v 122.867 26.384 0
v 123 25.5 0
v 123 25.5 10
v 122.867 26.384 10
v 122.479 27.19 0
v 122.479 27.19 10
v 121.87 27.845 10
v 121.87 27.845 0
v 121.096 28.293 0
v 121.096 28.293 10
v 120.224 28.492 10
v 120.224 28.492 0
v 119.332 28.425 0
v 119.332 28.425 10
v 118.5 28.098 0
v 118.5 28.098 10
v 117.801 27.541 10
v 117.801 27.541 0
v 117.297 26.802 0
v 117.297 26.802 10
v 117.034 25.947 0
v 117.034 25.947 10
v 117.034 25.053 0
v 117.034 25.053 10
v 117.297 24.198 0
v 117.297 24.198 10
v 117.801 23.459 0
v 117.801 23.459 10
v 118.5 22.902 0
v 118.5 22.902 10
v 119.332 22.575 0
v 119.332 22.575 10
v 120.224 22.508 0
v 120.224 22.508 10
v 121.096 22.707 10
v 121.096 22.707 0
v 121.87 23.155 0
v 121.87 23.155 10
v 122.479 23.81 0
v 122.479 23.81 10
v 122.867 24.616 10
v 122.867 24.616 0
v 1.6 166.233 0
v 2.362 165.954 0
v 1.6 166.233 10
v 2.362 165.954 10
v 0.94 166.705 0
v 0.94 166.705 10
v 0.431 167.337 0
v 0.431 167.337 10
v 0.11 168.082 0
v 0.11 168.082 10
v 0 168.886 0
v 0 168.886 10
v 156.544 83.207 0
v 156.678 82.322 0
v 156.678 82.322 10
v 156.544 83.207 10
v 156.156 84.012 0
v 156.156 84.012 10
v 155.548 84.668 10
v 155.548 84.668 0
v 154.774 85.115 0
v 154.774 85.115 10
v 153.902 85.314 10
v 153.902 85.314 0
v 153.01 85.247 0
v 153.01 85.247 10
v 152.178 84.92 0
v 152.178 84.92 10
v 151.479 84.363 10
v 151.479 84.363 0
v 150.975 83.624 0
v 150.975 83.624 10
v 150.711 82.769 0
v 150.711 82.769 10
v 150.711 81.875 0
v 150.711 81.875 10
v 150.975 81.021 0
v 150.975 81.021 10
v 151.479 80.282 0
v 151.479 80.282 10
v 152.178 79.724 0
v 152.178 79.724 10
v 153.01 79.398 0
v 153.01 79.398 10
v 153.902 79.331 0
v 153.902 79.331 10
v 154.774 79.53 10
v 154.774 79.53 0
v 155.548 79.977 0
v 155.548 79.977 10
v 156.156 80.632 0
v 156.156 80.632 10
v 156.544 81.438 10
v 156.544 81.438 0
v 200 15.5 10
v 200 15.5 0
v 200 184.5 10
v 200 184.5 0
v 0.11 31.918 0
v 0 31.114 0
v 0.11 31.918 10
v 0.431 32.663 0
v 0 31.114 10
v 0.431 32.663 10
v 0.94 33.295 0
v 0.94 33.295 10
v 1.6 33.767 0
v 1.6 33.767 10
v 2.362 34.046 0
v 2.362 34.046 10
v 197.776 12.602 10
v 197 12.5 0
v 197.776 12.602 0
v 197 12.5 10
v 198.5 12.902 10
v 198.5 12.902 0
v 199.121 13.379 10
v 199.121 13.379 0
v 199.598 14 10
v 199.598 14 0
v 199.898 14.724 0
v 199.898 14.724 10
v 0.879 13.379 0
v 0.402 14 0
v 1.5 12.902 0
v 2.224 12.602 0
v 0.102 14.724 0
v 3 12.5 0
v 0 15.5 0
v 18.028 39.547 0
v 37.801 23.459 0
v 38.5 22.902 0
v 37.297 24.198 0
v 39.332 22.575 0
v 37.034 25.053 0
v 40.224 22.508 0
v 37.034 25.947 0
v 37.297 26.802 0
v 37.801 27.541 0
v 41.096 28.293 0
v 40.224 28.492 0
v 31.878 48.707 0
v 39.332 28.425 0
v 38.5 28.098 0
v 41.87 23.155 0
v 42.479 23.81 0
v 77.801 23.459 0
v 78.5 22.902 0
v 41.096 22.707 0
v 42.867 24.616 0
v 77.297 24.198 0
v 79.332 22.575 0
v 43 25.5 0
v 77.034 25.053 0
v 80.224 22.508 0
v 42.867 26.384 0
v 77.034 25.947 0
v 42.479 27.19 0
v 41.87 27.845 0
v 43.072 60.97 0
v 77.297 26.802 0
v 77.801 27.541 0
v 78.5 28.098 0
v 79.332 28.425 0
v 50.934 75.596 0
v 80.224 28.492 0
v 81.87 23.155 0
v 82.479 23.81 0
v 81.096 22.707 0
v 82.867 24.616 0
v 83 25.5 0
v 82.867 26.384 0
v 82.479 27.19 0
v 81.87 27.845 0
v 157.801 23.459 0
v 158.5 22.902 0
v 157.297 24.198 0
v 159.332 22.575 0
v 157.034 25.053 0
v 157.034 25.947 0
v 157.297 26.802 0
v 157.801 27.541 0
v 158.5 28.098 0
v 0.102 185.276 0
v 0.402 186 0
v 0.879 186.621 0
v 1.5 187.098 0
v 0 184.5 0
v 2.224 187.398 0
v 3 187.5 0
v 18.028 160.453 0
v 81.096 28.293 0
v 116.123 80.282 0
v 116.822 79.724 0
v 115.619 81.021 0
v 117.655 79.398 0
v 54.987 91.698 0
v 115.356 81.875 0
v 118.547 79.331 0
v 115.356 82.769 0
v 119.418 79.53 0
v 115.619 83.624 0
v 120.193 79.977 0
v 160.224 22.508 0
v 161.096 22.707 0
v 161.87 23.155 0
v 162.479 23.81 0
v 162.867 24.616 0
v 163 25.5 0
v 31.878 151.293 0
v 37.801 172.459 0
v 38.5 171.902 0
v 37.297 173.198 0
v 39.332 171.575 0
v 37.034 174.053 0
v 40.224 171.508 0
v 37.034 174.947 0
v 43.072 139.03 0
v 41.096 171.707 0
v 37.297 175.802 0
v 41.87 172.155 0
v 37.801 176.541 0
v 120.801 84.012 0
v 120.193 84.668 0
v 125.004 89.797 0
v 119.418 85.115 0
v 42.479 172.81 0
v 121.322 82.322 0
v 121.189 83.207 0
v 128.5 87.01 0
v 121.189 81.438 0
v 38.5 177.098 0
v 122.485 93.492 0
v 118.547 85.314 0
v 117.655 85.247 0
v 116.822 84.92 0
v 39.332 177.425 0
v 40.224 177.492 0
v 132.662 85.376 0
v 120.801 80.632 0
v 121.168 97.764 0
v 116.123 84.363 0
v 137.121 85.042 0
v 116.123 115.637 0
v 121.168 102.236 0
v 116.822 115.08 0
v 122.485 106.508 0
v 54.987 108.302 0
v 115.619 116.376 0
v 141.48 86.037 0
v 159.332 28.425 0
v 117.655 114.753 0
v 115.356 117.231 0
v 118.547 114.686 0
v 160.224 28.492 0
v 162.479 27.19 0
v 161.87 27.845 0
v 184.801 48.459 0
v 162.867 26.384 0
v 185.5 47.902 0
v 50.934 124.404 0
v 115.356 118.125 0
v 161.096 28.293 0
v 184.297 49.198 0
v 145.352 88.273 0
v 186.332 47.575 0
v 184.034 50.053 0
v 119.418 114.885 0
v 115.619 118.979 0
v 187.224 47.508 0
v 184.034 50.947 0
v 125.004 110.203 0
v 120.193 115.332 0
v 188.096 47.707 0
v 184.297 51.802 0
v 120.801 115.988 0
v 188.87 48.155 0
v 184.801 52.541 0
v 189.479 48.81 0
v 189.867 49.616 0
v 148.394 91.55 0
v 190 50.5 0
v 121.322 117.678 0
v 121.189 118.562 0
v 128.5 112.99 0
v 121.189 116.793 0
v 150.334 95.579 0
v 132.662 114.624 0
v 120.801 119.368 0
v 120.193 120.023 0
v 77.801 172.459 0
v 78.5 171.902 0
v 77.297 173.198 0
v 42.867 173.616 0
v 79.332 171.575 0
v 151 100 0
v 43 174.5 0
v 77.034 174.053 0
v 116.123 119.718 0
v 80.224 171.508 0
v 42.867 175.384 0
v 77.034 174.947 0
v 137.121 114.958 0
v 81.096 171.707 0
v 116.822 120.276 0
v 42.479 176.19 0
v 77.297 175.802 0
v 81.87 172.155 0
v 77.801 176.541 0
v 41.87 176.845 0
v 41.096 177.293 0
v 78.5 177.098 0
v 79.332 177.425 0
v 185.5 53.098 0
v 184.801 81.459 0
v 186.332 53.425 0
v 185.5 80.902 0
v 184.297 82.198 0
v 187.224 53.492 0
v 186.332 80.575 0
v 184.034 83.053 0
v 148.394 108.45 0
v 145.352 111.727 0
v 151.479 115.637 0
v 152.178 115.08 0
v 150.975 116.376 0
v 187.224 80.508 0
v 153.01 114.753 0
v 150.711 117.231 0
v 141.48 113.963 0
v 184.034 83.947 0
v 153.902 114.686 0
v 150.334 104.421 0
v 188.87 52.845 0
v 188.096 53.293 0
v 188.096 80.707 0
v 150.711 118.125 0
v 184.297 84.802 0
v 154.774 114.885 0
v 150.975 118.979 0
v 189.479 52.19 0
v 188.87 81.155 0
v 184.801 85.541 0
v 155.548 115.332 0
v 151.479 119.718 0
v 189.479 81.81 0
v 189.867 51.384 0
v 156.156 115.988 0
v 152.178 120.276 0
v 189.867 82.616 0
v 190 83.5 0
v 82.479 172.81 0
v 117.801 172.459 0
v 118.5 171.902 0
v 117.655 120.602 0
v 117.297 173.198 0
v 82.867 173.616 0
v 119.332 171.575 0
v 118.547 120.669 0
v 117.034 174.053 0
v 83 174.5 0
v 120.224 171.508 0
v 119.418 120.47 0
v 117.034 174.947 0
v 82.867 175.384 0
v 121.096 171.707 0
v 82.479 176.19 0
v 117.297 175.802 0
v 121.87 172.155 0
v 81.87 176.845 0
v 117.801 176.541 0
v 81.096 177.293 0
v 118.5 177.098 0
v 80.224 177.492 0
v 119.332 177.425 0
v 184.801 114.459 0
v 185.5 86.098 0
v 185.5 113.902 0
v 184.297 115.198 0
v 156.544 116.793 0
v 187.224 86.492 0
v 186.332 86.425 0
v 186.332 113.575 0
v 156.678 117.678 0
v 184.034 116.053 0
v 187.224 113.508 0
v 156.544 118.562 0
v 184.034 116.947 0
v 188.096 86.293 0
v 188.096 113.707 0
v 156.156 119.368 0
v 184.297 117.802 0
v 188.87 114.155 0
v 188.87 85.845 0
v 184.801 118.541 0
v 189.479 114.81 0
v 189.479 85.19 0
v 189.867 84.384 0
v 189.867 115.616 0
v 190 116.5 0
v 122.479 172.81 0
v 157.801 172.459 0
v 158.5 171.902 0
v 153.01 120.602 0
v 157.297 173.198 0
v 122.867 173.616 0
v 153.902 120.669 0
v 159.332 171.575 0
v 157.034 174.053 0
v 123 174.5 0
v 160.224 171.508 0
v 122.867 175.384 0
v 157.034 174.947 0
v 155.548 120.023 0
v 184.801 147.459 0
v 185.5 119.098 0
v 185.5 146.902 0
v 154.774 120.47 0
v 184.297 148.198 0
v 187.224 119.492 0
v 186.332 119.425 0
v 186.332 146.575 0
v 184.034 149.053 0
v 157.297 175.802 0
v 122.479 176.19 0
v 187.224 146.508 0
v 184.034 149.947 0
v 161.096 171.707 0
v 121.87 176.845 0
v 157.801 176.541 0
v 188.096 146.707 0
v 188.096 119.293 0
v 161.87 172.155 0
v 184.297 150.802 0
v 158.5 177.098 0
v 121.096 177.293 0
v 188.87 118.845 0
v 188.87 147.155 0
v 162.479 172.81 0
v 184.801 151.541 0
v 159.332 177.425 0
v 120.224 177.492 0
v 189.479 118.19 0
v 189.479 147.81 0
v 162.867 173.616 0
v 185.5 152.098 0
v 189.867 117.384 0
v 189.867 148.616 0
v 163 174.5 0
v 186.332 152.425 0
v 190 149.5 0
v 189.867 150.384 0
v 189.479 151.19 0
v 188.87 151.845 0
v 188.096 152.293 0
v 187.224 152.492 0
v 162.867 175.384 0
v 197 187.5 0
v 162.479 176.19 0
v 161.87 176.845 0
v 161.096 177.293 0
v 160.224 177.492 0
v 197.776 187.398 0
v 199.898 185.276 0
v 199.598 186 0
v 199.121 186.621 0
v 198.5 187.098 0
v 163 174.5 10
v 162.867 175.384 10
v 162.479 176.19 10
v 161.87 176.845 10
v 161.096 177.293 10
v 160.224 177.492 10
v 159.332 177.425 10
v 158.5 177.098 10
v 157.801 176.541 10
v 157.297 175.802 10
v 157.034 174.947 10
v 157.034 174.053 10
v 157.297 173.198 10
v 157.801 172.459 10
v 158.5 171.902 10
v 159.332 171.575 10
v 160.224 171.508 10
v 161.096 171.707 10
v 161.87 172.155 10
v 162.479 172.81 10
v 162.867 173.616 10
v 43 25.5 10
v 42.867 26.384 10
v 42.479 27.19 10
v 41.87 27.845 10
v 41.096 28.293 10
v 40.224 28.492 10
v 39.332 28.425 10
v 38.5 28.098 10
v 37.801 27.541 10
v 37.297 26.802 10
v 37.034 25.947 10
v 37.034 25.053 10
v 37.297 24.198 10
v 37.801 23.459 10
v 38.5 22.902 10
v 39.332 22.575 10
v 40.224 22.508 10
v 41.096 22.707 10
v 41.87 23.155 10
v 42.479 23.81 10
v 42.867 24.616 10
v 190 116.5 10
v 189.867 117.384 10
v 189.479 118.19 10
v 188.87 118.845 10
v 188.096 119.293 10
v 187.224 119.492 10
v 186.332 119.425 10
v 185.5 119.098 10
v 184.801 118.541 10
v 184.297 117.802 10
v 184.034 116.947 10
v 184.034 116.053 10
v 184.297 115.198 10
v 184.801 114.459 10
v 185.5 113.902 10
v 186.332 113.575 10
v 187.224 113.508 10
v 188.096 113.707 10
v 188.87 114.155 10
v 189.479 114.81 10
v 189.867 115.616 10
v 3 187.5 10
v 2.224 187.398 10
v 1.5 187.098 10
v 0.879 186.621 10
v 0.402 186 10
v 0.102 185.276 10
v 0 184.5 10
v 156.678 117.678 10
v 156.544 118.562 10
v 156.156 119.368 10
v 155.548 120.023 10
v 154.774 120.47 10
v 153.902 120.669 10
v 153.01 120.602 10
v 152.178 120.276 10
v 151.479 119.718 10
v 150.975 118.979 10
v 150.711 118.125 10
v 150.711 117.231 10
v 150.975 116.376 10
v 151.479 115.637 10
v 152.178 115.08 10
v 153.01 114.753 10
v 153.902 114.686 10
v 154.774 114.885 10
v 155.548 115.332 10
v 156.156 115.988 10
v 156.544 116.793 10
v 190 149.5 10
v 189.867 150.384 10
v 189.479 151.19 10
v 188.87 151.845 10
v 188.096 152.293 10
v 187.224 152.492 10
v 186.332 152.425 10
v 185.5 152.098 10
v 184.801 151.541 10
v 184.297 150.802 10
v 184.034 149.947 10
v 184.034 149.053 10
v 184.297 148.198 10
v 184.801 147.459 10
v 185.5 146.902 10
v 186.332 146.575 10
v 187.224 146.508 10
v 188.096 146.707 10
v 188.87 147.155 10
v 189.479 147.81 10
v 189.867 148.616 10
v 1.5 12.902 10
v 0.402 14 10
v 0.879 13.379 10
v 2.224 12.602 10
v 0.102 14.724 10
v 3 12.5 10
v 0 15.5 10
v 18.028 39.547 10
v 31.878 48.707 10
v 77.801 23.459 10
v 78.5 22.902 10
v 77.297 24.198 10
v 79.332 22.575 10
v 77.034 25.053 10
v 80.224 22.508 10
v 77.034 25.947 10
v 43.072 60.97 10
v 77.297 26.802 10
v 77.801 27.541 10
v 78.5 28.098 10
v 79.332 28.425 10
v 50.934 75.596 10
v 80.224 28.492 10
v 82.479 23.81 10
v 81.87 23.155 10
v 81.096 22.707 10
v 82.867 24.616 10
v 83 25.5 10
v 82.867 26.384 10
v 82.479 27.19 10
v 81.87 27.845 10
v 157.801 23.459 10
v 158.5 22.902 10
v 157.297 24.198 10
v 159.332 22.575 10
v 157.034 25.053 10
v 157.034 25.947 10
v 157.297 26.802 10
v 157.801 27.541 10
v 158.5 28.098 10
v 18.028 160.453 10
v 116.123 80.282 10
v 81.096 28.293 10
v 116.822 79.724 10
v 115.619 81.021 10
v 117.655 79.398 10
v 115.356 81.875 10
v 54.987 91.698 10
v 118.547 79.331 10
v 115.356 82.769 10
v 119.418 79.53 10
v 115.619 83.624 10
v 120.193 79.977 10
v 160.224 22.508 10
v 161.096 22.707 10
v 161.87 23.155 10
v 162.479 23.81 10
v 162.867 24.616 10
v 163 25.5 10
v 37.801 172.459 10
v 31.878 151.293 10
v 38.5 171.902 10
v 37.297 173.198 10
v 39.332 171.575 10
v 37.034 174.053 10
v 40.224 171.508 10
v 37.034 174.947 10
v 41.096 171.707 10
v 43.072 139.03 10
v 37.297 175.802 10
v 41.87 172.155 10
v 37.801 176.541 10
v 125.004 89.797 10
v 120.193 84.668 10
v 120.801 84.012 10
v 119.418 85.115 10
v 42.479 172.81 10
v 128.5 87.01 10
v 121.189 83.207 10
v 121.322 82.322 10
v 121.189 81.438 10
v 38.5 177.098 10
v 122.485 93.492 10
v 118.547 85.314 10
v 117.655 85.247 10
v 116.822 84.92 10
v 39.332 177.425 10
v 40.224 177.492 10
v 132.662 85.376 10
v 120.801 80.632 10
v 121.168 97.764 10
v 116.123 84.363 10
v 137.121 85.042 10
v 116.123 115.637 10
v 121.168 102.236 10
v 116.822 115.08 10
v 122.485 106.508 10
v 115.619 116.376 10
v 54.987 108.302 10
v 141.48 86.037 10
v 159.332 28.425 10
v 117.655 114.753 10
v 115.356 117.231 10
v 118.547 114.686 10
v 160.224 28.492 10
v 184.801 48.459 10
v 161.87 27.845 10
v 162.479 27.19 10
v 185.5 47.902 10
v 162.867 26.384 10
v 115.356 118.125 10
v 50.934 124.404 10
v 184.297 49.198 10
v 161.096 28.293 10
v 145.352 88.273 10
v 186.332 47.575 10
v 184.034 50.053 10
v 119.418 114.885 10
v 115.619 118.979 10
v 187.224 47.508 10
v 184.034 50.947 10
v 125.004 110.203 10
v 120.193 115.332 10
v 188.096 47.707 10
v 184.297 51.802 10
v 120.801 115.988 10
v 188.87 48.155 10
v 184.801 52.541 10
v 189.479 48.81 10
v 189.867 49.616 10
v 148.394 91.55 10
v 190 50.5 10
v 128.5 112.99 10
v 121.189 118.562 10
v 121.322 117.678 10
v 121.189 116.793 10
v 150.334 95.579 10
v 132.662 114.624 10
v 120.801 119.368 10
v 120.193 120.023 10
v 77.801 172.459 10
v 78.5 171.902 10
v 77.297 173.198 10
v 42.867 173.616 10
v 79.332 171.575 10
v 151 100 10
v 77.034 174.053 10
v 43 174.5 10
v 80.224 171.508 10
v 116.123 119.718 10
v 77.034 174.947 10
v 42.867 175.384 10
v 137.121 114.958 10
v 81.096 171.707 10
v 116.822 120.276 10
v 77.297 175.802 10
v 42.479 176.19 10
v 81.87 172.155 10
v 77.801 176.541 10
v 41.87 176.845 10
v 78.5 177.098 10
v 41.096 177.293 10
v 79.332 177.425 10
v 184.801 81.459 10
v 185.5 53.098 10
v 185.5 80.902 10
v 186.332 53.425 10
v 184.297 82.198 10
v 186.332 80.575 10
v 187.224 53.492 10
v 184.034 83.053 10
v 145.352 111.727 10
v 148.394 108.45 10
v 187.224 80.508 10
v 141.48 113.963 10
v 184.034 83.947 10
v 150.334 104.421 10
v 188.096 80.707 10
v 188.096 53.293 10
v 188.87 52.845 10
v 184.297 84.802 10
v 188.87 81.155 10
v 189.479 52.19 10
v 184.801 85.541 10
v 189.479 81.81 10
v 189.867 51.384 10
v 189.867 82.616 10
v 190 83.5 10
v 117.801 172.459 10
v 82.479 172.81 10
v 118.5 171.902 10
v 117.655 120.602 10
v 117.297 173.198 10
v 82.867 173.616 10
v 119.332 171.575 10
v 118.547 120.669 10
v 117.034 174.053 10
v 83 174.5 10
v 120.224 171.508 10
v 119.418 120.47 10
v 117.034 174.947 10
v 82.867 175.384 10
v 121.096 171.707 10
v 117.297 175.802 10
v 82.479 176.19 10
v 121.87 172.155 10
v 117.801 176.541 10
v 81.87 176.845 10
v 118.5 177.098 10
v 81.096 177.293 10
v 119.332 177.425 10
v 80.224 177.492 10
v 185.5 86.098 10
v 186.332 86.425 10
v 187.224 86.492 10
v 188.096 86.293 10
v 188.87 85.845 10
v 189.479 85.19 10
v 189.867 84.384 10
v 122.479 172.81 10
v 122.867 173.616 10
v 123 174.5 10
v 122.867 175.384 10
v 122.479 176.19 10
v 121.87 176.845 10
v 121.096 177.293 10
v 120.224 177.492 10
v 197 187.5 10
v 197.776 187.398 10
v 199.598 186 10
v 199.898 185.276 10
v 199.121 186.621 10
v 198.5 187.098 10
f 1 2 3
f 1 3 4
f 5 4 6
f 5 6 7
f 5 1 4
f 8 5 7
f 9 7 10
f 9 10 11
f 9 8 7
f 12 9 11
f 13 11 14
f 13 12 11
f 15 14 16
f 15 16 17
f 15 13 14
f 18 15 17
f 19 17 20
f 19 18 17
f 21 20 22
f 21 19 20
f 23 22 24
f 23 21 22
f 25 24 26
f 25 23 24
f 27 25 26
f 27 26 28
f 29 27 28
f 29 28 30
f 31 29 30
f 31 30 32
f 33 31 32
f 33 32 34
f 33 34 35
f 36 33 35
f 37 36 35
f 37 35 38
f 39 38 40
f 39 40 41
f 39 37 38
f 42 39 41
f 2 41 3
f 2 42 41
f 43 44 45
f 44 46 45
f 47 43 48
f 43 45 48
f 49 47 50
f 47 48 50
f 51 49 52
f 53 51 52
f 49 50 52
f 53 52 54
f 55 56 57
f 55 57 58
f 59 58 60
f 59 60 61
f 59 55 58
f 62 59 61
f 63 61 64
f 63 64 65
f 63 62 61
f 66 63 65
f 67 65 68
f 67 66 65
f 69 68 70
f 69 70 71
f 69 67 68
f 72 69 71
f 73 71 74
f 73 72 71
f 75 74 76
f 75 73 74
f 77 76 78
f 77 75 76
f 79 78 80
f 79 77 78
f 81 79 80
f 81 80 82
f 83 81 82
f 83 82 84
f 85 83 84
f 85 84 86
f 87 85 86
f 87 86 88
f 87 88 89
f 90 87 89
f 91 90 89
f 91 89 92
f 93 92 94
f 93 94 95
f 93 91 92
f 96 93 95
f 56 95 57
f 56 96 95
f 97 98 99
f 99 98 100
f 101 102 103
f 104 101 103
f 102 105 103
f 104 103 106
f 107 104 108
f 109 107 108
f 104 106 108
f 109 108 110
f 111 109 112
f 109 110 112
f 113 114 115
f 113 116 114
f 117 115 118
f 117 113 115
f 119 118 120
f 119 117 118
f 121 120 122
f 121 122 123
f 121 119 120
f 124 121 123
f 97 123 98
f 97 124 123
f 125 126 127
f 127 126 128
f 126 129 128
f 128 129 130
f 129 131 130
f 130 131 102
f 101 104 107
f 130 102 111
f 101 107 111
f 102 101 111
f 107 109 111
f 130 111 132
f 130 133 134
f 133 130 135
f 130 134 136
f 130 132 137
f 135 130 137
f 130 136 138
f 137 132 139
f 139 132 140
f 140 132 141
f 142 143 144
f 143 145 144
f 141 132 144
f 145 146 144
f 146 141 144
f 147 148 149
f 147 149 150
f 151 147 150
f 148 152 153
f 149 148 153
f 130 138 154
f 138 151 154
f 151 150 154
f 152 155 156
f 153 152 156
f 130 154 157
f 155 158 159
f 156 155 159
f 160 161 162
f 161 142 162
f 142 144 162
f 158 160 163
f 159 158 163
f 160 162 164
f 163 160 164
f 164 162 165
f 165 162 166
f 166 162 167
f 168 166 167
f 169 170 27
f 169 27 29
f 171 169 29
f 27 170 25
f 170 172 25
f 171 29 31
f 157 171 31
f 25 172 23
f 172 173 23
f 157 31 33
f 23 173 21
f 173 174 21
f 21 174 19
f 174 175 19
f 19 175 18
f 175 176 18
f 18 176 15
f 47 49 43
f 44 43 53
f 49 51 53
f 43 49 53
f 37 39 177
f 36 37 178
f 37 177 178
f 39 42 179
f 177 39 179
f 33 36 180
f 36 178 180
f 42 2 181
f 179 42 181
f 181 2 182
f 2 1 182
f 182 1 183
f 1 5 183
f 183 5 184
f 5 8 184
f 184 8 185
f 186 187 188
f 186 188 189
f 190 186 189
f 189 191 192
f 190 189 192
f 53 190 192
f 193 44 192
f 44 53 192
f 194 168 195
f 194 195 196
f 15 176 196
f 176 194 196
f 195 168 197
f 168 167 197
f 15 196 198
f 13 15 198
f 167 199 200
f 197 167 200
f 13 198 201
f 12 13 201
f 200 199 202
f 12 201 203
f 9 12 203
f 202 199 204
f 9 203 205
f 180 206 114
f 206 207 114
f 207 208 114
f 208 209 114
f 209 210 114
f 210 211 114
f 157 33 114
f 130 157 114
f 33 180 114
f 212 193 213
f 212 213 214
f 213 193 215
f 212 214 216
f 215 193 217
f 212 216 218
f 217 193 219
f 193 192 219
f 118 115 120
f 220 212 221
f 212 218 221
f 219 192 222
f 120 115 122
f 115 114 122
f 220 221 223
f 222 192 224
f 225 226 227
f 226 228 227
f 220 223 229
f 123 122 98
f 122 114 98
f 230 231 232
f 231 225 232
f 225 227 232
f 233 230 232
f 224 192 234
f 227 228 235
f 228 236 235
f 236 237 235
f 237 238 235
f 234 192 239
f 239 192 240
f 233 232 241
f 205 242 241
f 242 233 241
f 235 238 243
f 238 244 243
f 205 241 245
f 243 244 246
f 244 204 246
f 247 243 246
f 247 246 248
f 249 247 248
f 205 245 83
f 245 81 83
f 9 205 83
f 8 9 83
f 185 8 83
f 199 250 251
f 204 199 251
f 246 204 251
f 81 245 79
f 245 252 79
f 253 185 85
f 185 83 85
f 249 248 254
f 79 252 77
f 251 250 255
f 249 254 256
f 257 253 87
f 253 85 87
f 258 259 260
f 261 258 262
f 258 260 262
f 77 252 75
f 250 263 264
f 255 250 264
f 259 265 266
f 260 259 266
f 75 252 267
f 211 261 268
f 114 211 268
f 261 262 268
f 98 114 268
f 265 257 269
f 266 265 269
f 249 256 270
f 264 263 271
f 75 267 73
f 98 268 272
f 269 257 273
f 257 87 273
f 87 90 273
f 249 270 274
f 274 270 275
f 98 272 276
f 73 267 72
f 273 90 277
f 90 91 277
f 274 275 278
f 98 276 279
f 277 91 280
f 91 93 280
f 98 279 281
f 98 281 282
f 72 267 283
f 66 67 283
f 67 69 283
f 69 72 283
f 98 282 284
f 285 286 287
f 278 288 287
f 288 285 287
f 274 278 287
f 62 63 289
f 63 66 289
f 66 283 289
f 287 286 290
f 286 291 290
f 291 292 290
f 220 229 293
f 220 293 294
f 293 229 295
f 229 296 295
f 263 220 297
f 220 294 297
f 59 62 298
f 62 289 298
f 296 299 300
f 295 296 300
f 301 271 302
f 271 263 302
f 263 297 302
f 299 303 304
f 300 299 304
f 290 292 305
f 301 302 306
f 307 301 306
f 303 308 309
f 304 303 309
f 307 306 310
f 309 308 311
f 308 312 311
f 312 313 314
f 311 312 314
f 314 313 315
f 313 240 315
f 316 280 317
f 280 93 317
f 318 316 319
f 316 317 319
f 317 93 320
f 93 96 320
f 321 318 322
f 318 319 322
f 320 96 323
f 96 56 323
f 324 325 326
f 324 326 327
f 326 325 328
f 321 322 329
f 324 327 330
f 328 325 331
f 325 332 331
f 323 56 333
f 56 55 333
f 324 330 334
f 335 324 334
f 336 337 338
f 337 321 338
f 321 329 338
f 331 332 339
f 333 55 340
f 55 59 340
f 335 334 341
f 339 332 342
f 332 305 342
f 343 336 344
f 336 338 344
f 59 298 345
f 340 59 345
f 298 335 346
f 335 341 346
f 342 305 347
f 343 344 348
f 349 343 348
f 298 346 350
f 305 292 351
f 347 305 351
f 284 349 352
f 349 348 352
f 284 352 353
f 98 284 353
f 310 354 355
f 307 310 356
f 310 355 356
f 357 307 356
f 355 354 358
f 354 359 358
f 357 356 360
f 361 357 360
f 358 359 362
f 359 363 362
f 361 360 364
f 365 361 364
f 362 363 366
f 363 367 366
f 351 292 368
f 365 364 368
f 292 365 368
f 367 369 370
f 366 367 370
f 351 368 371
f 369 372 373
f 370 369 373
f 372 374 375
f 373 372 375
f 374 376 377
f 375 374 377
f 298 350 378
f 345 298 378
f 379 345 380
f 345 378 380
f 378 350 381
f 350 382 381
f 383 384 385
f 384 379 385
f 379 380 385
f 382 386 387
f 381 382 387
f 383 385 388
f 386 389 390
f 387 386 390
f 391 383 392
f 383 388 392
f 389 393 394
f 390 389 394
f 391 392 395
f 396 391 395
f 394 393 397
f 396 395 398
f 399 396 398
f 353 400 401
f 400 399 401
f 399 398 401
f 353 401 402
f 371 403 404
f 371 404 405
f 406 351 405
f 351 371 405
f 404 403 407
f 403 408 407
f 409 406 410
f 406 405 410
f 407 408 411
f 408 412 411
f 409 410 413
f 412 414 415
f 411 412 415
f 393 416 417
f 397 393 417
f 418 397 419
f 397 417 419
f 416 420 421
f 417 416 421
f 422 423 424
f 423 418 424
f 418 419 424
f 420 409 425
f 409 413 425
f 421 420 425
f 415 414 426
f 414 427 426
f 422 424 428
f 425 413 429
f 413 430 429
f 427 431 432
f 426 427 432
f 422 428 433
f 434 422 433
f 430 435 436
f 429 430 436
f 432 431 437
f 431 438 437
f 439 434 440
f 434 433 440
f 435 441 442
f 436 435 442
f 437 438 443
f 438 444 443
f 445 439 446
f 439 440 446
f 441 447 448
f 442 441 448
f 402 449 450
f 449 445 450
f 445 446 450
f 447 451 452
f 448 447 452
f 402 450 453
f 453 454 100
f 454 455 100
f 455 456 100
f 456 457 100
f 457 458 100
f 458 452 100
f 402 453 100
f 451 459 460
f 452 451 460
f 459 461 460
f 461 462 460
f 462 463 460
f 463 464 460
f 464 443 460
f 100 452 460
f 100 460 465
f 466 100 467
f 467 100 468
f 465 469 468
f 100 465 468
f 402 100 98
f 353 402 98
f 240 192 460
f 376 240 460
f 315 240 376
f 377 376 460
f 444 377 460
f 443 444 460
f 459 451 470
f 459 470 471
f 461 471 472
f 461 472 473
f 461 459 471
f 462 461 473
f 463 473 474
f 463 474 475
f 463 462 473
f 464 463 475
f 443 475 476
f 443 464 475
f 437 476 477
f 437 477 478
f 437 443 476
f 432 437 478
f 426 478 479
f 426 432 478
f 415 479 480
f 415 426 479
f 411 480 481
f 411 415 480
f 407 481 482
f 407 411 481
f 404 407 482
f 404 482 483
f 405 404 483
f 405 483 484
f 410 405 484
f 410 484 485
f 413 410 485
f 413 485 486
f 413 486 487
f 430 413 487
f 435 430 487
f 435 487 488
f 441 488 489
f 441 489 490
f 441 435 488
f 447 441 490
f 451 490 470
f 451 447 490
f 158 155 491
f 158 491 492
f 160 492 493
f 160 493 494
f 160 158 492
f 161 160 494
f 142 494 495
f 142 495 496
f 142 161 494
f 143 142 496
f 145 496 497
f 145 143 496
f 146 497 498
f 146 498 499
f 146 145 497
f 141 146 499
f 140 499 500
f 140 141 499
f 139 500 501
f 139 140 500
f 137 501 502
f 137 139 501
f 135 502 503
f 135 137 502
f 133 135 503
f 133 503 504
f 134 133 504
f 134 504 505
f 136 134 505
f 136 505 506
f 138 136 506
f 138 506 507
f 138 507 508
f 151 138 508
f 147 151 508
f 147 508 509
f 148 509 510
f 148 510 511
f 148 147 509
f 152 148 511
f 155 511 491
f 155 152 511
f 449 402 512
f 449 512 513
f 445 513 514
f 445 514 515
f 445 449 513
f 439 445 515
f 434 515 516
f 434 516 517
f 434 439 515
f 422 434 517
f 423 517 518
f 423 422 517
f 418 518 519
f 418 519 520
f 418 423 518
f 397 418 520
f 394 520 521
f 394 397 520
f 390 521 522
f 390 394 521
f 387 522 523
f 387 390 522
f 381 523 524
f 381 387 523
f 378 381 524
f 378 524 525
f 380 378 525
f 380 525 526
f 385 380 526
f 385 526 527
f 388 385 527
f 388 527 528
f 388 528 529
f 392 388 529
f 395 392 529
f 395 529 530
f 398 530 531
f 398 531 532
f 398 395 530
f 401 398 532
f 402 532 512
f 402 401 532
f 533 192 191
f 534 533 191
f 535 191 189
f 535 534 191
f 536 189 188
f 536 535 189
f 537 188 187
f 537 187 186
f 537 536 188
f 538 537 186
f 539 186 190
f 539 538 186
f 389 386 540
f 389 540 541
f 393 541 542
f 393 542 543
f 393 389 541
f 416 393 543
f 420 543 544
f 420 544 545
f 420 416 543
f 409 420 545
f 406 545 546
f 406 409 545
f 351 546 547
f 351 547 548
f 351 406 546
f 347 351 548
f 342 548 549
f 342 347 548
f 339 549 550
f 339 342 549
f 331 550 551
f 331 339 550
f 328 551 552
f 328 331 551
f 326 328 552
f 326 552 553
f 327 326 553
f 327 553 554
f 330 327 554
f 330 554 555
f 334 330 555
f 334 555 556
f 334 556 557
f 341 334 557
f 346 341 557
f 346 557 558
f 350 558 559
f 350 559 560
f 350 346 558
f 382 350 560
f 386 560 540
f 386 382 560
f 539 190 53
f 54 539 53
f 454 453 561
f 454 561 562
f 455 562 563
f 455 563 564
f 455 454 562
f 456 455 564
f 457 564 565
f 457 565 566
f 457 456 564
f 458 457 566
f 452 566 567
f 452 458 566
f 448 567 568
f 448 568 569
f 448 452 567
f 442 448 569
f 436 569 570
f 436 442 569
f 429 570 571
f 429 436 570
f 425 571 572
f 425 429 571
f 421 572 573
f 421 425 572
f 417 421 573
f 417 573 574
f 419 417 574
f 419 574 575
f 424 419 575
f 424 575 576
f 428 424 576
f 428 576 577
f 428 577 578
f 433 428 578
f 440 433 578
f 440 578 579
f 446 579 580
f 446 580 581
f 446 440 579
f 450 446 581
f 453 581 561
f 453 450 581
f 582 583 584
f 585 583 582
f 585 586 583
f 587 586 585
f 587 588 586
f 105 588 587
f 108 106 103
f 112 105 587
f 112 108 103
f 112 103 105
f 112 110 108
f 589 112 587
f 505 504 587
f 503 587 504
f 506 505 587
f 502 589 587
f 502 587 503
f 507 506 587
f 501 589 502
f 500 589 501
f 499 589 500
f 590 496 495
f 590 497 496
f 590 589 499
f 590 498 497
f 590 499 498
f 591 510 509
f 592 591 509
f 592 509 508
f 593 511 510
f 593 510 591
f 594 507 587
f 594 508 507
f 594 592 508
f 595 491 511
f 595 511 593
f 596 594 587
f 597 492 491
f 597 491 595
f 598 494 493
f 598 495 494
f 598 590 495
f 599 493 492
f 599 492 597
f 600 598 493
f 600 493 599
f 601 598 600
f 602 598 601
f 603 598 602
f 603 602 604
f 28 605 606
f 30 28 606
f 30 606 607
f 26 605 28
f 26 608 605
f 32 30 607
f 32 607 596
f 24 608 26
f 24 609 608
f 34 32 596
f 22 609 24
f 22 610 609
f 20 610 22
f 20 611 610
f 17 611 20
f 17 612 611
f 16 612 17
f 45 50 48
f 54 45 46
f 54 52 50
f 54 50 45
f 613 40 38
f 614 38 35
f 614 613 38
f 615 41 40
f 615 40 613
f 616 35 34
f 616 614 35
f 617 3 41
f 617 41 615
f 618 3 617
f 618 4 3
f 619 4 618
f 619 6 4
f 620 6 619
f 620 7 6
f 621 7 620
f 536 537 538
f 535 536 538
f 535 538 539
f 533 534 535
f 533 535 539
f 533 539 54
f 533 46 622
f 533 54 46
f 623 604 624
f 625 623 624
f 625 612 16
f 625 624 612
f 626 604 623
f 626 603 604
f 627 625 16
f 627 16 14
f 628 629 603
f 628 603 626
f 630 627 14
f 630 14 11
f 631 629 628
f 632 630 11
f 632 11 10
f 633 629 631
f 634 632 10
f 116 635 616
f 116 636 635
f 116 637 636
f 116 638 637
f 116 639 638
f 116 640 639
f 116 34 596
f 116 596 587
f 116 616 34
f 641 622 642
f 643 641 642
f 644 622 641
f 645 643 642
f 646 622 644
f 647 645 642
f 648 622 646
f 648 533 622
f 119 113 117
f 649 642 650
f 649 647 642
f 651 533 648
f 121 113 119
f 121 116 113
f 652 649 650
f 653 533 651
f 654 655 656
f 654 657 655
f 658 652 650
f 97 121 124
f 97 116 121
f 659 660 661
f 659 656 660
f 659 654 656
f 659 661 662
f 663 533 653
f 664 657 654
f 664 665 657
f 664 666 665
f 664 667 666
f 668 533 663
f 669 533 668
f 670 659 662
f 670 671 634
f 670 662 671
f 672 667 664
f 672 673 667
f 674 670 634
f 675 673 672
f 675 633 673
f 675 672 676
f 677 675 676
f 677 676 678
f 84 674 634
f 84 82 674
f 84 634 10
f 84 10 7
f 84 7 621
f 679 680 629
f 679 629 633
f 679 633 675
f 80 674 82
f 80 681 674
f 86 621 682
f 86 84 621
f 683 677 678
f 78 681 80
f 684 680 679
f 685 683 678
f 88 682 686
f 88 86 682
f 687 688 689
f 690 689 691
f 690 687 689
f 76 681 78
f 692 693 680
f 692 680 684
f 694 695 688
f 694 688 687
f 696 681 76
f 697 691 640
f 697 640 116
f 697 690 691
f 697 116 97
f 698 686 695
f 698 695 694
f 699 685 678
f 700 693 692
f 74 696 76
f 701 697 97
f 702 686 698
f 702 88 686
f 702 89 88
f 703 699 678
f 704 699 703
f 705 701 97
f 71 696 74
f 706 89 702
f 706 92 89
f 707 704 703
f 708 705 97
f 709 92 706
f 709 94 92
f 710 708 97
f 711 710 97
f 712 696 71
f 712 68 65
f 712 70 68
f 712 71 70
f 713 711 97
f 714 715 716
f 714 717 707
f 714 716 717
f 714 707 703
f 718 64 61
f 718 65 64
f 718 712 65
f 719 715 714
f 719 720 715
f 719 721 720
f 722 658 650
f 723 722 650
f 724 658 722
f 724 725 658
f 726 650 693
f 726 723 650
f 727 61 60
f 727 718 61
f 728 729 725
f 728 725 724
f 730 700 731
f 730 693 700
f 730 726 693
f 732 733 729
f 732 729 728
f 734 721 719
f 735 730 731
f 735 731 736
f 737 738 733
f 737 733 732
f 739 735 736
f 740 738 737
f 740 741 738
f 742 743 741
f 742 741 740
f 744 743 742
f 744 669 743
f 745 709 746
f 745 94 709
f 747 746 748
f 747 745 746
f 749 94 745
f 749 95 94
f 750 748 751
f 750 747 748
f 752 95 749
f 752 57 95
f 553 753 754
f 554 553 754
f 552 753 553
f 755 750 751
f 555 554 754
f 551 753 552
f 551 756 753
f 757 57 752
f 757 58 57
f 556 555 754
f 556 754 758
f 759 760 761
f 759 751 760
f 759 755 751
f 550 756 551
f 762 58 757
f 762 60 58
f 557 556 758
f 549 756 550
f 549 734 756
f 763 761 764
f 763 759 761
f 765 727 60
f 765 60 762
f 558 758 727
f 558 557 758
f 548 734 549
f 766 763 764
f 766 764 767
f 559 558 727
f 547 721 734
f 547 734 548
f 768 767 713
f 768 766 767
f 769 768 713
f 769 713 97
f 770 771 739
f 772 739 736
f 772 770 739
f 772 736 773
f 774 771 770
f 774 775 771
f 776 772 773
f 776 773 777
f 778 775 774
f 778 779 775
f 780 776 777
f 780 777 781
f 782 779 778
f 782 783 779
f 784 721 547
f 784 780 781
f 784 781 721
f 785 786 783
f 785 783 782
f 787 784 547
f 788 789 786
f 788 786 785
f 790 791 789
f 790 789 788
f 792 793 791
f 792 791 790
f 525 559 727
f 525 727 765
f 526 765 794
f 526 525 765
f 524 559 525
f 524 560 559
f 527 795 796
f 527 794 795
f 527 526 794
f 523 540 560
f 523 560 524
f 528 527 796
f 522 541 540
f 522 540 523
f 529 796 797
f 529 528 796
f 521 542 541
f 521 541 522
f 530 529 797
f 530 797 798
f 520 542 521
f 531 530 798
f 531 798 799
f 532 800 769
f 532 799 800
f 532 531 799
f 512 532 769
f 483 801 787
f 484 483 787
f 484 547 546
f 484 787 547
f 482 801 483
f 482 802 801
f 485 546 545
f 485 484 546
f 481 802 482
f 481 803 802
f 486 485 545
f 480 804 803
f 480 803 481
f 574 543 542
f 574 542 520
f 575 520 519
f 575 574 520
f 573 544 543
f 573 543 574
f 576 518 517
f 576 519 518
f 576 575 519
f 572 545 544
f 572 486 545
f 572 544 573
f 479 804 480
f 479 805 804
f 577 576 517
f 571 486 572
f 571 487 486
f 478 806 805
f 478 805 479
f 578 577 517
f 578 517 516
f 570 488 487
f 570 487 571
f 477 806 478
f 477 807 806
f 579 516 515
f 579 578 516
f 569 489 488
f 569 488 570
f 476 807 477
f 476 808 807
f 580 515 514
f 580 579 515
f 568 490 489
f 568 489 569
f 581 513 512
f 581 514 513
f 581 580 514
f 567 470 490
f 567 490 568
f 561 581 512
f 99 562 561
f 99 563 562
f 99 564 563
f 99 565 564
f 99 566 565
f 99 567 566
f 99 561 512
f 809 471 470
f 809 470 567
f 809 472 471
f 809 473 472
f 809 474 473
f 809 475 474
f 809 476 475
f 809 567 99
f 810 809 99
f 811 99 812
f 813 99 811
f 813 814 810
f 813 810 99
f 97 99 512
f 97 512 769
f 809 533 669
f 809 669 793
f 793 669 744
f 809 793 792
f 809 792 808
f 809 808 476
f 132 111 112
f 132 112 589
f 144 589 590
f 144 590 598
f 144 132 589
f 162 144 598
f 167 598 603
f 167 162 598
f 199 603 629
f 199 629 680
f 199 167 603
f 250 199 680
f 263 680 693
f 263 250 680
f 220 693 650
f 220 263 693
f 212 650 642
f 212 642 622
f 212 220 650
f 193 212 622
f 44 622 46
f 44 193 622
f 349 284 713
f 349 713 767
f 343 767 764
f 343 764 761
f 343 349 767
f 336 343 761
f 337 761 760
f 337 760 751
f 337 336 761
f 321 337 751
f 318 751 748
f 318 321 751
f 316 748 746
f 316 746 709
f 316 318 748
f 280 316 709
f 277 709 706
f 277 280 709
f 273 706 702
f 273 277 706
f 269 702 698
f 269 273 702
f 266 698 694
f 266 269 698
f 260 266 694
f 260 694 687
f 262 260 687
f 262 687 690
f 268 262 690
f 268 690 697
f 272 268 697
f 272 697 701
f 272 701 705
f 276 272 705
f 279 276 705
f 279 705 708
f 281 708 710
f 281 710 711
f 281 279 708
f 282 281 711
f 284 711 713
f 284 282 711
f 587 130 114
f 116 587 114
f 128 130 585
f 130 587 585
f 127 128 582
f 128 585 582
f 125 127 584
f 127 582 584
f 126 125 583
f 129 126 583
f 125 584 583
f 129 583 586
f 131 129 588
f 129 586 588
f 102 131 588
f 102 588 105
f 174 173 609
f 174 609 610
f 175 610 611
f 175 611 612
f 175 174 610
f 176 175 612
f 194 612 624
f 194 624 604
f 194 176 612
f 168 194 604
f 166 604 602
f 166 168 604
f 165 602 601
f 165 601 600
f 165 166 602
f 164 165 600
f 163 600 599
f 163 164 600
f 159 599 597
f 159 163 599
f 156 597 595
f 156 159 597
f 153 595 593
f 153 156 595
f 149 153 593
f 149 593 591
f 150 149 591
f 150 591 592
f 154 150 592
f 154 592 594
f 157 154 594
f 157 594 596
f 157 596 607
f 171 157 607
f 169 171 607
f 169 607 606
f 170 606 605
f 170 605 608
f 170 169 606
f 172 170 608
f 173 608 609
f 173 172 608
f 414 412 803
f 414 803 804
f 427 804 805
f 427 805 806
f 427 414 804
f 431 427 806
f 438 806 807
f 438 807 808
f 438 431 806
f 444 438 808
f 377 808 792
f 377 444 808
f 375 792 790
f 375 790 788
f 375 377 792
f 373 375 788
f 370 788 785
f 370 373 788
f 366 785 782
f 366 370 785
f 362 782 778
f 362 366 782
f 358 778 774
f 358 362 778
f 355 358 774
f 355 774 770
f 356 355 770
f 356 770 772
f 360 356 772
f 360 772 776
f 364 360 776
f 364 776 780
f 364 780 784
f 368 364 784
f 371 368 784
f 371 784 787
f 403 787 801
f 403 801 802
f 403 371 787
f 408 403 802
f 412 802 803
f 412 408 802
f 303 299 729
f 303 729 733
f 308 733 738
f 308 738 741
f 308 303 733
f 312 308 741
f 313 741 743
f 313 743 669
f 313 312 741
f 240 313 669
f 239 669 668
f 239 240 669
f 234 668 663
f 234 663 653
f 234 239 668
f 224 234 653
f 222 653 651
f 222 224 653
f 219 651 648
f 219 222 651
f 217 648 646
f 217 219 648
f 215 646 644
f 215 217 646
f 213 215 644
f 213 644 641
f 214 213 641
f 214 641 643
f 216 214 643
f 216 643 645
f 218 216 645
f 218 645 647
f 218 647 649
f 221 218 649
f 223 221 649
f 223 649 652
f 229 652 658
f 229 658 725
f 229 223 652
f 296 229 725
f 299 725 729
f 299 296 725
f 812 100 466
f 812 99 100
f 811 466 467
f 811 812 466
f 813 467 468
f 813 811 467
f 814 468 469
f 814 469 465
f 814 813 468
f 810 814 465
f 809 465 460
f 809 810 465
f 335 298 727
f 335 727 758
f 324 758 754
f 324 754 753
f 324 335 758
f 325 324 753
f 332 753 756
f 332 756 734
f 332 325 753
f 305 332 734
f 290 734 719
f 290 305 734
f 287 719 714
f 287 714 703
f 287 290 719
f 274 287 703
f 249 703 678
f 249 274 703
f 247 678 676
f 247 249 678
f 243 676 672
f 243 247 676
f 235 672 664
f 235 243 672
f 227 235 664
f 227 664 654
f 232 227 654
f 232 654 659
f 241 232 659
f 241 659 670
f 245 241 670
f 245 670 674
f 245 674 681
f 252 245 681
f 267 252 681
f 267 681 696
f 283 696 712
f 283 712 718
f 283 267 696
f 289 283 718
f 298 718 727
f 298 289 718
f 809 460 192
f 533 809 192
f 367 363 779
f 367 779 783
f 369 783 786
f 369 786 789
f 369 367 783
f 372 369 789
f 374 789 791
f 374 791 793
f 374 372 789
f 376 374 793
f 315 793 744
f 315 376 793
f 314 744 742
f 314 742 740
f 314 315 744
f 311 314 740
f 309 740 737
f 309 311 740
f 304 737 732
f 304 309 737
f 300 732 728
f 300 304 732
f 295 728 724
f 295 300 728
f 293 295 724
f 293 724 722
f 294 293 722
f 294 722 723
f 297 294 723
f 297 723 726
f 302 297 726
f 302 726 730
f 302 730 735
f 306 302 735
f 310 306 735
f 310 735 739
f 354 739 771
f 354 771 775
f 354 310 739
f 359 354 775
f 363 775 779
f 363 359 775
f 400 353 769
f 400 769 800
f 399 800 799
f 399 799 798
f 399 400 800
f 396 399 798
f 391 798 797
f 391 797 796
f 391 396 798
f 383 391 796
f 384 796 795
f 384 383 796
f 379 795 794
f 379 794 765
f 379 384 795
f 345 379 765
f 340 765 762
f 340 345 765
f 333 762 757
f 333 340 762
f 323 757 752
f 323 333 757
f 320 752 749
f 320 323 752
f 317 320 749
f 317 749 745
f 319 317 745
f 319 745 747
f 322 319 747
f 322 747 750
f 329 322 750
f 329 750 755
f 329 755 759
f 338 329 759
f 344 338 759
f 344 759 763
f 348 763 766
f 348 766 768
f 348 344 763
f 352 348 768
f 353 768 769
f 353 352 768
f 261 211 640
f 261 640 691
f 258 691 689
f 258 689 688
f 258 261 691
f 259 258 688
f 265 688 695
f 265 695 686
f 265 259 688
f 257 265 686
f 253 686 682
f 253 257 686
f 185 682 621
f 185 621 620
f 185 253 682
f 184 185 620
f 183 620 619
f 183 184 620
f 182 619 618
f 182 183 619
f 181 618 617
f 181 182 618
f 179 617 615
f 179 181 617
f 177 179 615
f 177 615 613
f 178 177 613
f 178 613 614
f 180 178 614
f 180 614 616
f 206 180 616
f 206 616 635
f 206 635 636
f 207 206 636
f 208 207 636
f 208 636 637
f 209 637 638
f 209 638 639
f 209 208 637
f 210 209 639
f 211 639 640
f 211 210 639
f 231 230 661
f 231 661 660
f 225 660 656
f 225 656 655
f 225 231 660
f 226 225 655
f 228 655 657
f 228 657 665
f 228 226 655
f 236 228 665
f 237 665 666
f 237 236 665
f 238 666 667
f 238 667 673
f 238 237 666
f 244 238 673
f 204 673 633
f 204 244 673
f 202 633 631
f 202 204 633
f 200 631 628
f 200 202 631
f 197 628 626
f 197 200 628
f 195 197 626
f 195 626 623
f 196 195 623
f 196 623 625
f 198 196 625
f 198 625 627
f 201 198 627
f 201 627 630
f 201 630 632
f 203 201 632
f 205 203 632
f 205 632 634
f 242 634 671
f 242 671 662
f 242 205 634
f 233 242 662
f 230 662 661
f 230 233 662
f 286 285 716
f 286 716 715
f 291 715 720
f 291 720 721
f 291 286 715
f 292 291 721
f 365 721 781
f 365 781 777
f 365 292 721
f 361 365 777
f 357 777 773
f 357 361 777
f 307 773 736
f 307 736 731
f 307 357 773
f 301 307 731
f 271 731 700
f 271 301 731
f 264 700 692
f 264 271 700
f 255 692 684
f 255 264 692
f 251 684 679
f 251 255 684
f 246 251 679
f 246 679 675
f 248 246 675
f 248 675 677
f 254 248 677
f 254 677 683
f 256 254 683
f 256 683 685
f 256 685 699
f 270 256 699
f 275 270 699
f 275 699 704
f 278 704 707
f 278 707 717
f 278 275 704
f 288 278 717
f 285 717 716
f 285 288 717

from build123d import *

# Parameters (mm, degrees)
SKETCH_R   = 15
SKETCH_R_2 = 3
PAD_DEPTH  = 10
FILLET_R   = 3


with BuildPart() as part:
    # Sketch → Pad (new body)
    with BuildSketch(Plane.XY):
        with BuildLine():
            Line((0, 12.5), (200, 12.5))
            Line((200, 12.5), (200, 187.5))
            Line((200, 187.5), (0, 187.5))
            Line((0, 187.5), (0, 166.424769))
            ThreePointArc((0, 33.575231), (55.5, 100), (0, 166.424769))
            Line((0, 12.5), (0, 33.575231))
        make_face()
        with Locations((136, 100)):
            Circle(SKETCH_R, mode=Mode.SUBTRACT)
        with Locations((118.32233, 117.67767)):
            Circle(SKETCH_R_2, mode=Mode.SUBTRACT)
        with Locations((153.67767, 117.67767)):
            Circle(SKETCH_R_2, mode=Mode.SUBTRACT)
        with Locations((118.32233, 82.32233)):
            Circle(SKETCH_R_2, mode=Mode.SUBTRACT)
        with Locations((153.67767, 82.32233)):
            Circle(SKETCH_R_2, mode=Mode.SUBTRACT)
        with Locations((40, 25.5)):
            Circle(SKETCH_R_2, mode=Mode.SUBTRACT)
        with Locations((160, 25.5)):
            Circle(SKETCH_R_2, mode=Mode.SUBTRACT)
        with Locations((80, 25.5)):
            Circle(SKETCH_R_2, mode=Mode.SUBTRACT)
        with Locations((120, 25.5)):
            Circle(SKETCH_R_2, mode=Mode.SUBTRACT)
        with Locations((40, 174.5)):
            Circle(SKETCH_R_2, mode=Mode.SUBTRACT)
        with Locations((80, 174.5)):
            Circle(SKETCH_R_2, mode=Mode.SUBTRACT)
        with Locations((120, 174.5)):
            Circle(SKETCH_R_2, mode=Mode.SUBTRACT)
        with Locations((160, 174.5)):
            Circle(SKETCH_R_2, mode=Mode.SUBTRACT)
        with Locations((187, 149.5)):
            Circle(SKETCH_R_2, mode=Mode.SUBTRACT)
        with Locations((187, 116.5)):
            Circle(SKETCH_R_2, mode=Mode.SUBTRACT)
        with Locations((187, 83.5)):
            Circle(SKETCH_R_2, mode=Mode.SUBTRACT)
        with Locations((187, 50.5)):
            Circle(SKETCH_R_2, mode=Mode.SUBTRACT)
    extrude(amount=PAD_DEPTH)

    # Fillet
    fillet_edges = [part.edges().sort_by_distance(p)[0] for p in [
        (0, 12.5, 5),
        (0, 33.575231, 5),
        (0, 166.424769, 5),
        (0, 187.5, 5),
        (200, 12.5, 5),
        (200, 187.5, 5),
    ]]
    fillet(fillet_edges, radius=FILLET_R)


solid = part.part
